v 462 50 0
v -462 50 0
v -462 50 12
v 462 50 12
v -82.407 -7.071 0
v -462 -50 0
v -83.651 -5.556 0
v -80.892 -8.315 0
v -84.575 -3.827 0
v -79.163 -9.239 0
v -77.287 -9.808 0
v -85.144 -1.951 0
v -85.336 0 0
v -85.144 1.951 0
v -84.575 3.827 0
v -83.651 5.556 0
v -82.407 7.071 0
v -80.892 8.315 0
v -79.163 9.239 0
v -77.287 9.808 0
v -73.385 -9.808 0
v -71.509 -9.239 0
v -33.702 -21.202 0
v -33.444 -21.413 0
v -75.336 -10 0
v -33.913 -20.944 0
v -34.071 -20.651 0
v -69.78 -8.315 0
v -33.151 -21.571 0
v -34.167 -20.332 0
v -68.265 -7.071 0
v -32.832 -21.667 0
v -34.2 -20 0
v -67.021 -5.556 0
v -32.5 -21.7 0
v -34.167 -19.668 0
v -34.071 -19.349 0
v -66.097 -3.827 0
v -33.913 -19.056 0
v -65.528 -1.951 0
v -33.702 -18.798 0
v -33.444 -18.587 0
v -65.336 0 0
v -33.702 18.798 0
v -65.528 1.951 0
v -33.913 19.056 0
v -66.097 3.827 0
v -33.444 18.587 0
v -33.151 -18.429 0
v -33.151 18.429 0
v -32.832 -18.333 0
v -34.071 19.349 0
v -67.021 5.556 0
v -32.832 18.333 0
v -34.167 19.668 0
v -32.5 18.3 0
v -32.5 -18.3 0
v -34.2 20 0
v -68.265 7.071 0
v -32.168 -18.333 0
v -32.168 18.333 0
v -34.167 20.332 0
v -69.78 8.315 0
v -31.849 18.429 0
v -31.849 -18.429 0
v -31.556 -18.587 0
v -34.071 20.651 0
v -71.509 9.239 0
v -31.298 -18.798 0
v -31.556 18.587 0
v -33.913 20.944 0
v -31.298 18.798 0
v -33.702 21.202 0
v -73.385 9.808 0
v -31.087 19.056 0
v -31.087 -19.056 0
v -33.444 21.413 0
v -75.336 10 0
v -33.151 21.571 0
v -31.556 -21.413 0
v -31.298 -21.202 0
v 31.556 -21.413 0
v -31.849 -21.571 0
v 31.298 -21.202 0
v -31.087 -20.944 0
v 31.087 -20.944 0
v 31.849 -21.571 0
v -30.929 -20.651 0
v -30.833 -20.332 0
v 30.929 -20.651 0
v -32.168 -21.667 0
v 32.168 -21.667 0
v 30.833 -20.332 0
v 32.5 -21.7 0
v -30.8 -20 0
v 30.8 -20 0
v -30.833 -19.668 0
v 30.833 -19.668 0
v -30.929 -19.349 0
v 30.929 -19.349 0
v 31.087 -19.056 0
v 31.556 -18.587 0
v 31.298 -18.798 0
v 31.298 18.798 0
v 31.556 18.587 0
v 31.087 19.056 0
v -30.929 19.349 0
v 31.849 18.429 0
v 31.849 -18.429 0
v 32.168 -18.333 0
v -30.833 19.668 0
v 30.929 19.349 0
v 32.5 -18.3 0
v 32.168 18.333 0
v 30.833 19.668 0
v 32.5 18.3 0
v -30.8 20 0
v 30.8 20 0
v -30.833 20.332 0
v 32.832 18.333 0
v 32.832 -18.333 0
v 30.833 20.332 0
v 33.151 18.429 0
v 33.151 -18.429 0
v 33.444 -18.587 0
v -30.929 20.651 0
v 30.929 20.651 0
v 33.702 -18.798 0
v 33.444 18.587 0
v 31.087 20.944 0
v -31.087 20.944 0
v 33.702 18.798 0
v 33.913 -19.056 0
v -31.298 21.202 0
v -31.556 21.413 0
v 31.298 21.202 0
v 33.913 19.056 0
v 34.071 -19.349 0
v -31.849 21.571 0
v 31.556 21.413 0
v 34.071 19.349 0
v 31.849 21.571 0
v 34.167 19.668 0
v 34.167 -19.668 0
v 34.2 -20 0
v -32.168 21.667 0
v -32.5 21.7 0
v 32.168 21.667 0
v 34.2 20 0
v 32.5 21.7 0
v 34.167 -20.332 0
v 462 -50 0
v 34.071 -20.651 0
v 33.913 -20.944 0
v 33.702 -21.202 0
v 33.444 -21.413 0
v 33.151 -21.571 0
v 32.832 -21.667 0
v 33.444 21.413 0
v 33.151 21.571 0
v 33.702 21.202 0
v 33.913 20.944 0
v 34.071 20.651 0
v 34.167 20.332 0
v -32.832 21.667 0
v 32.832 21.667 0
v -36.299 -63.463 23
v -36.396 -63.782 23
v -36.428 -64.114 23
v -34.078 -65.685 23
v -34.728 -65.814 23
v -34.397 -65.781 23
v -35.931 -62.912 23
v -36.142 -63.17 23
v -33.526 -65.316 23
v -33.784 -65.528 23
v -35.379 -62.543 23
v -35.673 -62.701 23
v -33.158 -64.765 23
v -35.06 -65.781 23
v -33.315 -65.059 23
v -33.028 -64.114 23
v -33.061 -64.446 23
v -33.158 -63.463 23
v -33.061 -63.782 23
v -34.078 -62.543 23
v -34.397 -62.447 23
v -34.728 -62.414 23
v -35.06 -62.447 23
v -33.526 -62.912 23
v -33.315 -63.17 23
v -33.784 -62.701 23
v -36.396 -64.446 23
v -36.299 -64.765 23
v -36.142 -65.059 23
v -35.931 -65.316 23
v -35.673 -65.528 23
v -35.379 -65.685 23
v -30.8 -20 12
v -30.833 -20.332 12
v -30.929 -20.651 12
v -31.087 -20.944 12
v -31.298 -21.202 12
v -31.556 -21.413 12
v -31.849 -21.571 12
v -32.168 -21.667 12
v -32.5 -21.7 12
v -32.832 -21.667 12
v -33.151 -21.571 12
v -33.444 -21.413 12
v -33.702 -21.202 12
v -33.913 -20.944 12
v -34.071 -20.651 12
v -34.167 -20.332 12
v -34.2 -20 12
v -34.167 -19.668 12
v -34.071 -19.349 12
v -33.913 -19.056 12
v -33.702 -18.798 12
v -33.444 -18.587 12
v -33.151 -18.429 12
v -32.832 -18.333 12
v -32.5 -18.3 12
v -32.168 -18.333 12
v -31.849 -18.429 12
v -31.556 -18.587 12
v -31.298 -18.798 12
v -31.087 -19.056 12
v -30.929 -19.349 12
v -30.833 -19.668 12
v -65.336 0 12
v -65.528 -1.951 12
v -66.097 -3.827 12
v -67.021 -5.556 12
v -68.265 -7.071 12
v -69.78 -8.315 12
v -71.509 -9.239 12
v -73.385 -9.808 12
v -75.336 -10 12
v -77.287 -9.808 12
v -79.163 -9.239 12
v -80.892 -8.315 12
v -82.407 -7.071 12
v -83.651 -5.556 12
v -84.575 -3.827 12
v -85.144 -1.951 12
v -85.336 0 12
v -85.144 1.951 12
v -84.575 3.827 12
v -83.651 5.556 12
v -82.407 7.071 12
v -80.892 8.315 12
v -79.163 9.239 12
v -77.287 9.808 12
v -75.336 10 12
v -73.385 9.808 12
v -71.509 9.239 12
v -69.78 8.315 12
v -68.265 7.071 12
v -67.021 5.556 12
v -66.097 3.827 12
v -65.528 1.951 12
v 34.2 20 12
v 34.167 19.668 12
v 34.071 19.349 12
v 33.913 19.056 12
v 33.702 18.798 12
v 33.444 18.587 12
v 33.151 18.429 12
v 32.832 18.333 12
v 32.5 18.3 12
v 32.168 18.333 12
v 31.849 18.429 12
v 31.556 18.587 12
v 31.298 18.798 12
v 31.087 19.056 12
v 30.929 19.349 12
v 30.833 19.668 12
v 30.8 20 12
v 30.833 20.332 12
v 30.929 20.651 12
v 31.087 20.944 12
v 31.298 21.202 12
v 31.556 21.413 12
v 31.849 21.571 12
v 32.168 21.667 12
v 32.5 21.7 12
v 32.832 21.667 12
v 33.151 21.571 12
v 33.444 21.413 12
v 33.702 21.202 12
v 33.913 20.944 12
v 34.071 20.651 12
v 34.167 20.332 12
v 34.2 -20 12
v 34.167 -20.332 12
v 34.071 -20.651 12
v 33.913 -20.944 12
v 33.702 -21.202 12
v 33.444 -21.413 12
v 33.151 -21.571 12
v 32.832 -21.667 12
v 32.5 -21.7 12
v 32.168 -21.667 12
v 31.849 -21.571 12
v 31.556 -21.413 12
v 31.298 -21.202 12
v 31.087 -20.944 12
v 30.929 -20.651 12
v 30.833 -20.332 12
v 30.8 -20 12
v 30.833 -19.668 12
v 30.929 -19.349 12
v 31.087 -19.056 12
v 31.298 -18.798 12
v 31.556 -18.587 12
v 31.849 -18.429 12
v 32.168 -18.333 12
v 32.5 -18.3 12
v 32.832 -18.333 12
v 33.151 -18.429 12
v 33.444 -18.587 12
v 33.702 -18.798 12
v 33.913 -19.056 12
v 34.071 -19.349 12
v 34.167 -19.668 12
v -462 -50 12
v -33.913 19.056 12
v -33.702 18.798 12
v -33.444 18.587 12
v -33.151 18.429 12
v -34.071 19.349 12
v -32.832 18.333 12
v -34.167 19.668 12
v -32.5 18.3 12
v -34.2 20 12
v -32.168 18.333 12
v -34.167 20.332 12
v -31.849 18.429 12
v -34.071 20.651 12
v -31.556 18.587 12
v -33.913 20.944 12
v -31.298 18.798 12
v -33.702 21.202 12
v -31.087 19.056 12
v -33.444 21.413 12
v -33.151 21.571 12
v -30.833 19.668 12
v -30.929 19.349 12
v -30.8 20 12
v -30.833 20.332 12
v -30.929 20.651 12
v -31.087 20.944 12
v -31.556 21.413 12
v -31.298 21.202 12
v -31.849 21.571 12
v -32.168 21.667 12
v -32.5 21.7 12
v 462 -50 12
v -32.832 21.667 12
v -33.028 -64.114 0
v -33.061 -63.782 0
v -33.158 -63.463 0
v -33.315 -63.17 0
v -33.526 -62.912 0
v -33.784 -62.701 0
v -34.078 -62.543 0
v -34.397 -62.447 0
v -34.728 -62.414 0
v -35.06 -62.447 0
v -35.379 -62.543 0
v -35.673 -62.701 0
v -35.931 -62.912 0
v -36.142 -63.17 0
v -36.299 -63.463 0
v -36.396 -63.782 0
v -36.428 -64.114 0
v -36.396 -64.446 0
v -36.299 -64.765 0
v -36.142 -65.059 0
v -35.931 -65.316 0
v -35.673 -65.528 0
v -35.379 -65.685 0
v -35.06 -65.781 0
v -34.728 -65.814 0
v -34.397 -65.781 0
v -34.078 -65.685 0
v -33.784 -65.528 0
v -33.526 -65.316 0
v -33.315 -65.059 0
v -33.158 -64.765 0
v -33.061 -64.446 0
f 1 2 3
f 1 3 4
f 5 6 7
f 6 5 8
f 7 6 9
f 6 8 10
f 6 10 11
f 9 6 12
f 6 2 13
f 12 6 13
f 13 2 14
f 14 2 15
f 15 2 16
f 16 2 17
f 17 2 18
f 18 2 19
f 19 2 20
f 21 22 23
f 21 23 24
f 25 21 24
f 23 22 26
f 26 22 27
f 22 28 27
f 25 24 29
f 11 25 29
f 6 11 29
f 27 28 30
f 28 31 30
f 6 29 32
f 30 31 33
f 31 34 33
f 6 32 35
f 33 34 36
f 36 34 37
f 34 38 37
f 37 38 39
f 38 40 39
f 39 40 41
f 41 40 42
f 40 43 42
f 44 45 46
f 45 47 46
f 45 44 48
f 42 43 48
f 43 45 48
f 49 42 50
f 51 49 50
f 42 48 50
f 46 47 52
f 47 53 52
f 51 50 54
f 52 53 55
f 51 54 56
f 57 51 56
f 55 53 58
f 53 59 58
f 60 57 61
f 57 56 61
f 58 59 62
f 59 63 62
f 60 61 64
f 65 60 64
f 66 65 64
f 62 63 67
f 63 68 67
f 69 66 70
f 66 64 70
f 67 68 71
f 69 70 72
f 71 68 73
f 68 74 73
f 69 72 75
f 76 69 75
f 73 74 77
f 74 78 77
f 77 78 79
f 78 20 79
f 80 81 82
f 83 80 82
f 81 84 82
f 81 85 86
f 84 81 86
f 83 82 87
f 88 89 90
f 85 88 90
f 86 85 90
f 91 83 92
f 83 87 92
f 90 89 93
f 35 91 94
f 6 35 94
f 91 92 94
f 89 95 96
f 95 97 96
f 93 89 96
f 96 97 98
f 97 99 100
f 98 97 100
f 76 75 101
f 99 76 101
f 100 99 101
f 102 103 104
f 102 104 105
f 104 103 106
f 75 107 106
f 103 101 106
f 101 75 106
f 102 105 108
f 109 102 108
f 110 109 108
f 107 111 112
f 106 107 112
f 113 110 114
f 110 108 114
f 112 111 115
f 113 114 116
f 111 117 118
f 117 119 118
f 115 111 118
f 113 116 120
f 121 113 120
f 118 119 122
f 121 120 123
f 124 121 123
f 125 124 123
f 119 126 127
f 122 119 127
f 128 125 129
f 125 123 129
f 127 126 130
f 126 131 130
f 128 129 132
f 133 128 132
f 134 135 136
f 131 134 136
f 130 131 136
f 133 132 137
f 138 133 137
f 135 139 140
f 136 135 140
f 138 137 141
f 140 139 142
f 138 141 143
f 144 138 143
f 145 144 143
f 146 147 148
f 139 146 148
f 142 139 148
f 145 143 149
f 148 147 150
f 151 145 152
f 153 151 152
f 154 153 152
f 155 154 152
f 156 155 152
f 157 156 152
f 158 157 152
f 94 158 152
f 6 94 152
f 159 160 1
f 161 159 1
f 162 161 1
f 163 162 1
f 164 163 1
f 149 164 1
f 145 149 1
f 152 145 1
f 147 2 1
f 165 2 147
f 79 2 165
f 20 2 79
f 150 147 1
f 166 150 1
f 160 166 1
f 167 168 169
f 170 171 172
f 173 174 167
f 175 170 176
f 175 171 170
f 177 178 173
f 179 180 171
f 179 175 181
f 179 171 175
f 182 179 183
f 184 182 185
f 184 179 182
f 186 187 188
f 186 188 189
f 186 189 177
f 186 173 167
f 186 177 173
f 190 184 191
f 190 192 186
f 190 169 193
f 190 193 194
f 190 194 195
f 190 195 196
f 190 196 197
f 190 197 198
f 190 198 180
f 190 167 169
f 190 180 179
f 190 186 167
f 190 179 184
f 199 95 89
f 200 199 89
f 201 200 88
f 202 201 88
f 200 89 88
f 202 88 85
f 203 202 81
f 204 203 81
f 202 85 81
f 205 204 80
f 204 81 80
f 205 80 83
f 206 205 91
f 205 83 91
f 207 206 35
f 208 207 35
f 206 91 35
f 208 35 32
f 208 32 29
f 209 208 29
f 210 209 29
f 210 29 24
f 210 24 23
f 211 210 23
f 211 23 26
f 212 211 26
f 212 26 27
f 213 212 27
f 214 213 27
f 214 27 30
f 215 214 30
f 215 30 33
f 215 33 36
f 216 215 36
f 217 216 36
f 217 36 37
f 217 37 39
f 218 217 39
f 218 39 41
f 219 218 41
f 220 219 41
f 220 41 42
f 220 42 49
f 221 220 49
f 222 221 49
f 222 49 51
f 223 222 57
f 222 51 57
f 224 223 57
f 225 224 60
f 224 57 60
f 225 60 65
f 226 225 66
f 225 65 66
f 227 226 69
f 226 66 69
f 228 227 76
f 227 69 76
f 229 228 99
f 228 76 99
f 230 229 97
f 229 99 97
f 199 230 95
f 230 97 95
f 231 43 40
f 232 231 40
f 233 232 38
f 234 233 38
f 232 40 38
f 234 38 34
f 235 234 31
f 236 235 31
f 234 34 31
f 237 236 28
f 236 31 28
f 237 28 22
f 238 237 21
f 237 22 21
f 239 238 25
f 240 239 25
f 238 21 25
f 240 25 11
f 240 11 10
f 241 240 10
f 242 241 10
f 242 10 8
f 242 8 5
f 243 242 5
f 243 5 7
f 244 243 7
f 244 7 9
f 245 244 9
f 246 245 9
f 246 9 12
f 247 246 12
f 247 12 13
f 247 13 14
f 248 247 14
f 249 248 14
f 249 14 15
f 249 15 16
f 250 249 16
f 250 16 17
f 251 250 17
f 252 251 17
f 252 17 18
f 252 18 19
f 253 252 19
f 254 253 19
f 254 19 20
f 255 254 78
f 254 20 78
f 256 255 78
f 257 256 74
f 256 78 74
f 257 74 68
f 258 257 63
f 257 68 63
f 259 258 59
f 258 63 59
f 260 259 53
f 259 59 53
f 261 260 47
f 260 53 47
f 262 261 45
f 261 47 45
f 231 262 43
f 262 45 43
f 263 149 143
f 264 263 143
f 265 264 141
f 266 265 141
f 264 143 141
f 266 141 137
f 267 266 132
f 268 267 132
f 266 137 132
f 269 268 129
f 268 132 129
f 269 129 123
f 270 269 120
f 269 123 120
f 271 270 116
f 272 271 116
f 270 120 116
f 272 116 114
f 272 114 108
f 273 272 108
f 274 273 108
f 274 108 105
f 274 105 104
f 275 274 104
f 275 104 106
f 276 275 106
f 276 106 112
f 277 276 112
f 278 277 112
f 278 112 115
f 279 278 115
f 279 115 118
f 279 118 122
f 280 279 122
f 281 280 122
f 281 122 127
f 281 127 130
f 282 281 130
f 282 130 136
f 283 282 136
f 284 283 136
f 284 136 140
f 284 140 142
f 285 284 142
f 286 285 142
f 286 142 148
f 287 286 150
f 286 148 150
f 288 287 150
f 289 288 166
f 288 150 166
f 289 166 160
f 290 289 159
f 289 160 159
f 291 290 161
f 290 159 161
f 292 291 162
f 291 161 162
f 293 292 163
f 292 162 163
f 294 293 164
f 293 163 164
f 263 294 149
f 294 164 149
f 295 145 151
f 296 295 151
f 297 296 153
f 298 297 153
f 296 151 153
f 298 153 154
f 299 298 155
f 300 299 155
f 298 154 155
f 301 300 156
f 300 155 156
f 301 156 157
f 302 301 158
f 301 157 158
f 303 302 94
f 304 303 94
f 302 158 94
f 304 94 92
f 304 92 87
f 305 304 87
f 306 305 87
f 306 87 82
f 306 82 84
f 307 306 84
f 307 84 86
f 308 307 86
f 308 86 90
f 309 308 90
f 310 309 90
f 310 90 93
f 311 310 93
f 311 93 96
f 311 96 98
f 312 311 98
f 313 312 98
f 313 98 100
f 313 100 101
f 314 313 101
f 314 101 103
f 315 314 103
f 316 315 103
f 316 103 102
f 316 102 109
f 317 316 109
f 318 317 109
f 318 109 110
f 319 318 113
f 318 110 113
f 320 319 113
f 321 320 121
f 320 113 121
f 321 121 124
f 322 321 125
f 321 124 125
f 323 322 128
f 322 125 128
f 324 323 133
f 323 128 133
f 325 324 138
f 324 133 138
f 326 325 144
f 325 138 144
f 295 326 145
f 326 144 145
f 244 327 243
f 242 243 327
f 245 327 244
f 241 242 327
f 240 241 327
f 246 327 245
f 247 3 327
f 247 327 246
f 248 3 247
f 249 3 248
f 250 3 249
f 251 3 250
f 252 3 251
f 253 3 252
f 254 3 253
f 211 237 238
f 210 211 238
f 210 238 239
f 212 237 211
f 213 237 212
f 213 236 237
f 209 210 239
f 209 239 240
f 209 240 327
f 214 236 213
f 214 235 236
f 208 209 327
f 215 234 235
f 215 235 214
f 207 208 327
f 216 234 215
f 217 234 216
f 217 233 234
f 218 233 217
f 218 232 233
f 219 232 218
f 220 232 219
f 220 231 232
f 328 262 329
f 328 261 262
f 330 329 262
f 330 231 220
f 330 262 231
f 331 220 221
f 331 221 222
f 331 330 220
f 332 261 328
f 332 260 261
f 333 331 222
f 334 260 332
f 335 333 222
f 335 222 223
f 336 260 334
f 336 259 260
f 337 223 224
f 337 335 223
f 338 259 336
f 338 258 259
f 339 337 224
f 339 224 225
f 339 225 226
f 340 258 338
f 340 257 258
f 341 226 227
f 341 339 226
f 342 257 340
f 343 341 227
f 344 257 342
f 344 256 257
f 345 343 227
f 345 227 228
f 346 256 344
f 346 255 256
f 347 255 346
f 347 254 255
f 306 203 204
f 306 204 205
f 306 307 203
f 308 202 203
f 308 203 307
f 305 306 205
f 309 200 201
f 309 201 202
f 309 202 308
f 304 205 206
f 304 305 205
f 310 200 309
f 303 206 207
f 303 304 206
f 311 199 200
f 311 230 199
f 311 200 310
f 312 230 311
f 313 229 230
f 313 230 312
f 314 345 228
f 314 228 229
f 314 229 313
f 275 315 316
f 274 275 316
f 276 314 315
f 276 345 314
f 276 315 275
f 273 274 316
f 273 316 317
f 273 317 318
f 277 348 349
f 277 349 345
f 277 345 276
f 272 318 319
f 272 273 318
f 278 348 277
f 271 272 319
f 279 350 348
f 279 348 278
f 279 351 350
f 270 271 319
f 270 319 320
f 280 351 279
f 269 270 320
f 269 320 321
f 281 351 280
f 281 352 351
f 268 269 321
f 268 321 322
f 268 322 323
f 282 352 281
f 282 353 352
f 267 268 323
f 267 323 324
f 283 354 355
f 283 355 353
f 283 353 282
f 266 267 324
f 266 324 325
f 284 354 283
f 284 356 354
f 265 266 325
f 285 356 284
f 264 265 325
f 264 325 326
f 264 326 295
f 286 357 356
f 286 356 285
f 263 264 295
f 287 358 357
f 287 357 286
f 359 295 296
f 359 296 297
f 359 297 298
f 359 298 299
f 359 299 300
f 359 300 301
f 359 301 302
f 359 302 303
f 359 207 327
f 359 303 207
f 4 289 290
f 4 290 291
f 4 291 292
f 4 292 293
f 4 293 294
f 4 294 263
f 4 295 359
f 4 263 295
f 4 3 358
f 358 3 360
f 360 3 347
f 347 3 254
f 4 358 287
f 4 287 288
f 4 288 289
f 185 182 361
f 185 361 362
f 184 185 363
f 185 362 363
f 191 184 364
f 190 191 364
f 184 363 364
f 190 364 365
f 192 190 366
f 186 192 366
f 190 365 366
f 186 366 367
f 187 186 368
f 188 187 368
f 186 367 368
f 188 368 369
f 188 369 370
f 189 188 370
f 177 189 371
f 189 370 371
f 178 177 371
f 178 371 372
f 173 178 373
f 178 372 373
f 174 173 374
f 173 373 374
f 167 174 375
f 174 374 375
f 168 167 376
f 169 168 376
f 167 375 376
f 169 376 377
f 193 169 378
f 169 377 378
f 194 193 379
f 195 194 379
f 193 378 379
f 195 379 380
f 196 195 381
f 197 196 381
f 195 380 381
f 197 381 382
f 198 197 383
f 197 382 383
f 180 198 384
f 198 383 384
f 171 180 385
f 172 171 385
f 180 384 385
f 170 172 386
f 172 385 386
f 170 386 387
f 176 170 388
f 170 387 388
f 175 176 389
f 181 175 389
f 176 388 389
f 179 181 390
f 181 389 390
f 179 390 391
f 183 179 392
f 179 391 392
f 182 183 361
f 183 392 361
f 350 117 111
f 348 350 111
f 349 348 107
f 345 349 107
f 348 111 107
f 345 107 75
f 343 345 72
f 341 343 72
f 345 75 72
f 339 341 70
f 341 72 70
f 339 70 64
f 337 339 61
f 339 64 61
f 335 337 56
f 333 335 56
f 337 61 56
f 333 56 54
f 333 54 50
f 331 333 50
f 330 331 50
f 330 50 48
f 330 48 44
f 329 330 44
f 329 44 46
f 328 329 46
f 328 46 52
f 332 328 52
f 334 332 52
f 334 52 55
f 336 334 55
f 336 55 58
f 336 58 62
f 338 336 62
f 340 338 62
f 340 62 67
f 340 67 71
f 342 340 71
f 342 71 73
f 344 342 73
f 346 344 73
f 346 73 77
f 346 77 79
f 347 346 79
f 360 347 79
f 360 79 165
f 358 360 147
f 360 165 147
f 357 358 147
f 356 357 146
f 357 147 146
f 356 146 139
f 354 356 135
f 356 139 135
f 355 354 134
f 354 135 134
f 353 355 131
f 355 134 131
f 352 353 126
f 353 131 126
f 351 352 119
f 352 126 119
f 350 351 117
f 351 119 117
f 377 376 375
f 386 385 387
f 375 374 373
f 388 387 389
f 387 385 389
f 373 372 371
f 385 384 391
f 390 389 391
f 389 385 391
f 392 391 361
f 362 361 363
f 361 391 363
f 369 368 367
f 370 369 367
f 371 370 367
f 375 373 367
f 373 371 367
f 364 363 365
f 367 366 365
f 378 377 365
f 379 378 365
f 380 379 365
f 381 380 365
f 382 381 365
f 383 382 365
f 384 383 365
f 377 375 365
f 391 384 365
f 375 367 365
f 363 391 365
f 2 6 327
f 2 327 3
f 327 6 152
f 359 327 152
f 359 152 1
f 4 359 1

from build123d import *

# Parameters (mm, degrees)
F0_W     = 924
F0_H     = 100
F1_DEPTH = 12
F2_R     = 10
F3_DEPTH = 25
F2_R_2   = 1.7
F4_DEPTH = 25
F5_R     = 1.7
F6_DEPTH = 23


with BuildPart() as f1:
    # F0 (on Top) → F1 (new body)
    with BuildSketch(Plane.XY):
        Rectangle(F0_W, F0_H)
    extrude(amount=F1_DEPTH)

    # F2 (on face) → F3 (cut)
    with BuildSketch(Plane(origin=(0, 0, 0), x_dir=(1, 0, 0), z_dir=(0, 0, -1))):
        with Locations((-75.335987, 0)):
            Circle(F2_R)
    extrude(amount=-F3_DEPTH, mode=Mode.SUBTRACT)

    # F2 (on face) → F4 (cut)
    with BuildSketch(Plane(origin=(0, 0, 0), x_dir=(1, 0, 0), z_dir=(0, 0, -1))):
        with Locations((32.5, -20)):
            Circle(F2_R_2)
        with Locations((-32.5, -20)):
            Circle(F2_R_2)
        with Locations((32.5, 20)):
            Circle(F2_R_2)
        with Locations((-32.5, 20)):
            Circle(F2_R_2)
    extrude(amount=-F4_DEPTH, mode=Mode.SUBTRACT)


with BuildPart() as f6:
    # F5 (on Top) → F6 (new body)
    with BuildSketch(Plane.XY):
        with Locations((-34.728434, -64.114057)):
            Circle(F5_R)
    extrude(amount=F6_DEPTH)


solid = Compound([f1.part, f6.part])
